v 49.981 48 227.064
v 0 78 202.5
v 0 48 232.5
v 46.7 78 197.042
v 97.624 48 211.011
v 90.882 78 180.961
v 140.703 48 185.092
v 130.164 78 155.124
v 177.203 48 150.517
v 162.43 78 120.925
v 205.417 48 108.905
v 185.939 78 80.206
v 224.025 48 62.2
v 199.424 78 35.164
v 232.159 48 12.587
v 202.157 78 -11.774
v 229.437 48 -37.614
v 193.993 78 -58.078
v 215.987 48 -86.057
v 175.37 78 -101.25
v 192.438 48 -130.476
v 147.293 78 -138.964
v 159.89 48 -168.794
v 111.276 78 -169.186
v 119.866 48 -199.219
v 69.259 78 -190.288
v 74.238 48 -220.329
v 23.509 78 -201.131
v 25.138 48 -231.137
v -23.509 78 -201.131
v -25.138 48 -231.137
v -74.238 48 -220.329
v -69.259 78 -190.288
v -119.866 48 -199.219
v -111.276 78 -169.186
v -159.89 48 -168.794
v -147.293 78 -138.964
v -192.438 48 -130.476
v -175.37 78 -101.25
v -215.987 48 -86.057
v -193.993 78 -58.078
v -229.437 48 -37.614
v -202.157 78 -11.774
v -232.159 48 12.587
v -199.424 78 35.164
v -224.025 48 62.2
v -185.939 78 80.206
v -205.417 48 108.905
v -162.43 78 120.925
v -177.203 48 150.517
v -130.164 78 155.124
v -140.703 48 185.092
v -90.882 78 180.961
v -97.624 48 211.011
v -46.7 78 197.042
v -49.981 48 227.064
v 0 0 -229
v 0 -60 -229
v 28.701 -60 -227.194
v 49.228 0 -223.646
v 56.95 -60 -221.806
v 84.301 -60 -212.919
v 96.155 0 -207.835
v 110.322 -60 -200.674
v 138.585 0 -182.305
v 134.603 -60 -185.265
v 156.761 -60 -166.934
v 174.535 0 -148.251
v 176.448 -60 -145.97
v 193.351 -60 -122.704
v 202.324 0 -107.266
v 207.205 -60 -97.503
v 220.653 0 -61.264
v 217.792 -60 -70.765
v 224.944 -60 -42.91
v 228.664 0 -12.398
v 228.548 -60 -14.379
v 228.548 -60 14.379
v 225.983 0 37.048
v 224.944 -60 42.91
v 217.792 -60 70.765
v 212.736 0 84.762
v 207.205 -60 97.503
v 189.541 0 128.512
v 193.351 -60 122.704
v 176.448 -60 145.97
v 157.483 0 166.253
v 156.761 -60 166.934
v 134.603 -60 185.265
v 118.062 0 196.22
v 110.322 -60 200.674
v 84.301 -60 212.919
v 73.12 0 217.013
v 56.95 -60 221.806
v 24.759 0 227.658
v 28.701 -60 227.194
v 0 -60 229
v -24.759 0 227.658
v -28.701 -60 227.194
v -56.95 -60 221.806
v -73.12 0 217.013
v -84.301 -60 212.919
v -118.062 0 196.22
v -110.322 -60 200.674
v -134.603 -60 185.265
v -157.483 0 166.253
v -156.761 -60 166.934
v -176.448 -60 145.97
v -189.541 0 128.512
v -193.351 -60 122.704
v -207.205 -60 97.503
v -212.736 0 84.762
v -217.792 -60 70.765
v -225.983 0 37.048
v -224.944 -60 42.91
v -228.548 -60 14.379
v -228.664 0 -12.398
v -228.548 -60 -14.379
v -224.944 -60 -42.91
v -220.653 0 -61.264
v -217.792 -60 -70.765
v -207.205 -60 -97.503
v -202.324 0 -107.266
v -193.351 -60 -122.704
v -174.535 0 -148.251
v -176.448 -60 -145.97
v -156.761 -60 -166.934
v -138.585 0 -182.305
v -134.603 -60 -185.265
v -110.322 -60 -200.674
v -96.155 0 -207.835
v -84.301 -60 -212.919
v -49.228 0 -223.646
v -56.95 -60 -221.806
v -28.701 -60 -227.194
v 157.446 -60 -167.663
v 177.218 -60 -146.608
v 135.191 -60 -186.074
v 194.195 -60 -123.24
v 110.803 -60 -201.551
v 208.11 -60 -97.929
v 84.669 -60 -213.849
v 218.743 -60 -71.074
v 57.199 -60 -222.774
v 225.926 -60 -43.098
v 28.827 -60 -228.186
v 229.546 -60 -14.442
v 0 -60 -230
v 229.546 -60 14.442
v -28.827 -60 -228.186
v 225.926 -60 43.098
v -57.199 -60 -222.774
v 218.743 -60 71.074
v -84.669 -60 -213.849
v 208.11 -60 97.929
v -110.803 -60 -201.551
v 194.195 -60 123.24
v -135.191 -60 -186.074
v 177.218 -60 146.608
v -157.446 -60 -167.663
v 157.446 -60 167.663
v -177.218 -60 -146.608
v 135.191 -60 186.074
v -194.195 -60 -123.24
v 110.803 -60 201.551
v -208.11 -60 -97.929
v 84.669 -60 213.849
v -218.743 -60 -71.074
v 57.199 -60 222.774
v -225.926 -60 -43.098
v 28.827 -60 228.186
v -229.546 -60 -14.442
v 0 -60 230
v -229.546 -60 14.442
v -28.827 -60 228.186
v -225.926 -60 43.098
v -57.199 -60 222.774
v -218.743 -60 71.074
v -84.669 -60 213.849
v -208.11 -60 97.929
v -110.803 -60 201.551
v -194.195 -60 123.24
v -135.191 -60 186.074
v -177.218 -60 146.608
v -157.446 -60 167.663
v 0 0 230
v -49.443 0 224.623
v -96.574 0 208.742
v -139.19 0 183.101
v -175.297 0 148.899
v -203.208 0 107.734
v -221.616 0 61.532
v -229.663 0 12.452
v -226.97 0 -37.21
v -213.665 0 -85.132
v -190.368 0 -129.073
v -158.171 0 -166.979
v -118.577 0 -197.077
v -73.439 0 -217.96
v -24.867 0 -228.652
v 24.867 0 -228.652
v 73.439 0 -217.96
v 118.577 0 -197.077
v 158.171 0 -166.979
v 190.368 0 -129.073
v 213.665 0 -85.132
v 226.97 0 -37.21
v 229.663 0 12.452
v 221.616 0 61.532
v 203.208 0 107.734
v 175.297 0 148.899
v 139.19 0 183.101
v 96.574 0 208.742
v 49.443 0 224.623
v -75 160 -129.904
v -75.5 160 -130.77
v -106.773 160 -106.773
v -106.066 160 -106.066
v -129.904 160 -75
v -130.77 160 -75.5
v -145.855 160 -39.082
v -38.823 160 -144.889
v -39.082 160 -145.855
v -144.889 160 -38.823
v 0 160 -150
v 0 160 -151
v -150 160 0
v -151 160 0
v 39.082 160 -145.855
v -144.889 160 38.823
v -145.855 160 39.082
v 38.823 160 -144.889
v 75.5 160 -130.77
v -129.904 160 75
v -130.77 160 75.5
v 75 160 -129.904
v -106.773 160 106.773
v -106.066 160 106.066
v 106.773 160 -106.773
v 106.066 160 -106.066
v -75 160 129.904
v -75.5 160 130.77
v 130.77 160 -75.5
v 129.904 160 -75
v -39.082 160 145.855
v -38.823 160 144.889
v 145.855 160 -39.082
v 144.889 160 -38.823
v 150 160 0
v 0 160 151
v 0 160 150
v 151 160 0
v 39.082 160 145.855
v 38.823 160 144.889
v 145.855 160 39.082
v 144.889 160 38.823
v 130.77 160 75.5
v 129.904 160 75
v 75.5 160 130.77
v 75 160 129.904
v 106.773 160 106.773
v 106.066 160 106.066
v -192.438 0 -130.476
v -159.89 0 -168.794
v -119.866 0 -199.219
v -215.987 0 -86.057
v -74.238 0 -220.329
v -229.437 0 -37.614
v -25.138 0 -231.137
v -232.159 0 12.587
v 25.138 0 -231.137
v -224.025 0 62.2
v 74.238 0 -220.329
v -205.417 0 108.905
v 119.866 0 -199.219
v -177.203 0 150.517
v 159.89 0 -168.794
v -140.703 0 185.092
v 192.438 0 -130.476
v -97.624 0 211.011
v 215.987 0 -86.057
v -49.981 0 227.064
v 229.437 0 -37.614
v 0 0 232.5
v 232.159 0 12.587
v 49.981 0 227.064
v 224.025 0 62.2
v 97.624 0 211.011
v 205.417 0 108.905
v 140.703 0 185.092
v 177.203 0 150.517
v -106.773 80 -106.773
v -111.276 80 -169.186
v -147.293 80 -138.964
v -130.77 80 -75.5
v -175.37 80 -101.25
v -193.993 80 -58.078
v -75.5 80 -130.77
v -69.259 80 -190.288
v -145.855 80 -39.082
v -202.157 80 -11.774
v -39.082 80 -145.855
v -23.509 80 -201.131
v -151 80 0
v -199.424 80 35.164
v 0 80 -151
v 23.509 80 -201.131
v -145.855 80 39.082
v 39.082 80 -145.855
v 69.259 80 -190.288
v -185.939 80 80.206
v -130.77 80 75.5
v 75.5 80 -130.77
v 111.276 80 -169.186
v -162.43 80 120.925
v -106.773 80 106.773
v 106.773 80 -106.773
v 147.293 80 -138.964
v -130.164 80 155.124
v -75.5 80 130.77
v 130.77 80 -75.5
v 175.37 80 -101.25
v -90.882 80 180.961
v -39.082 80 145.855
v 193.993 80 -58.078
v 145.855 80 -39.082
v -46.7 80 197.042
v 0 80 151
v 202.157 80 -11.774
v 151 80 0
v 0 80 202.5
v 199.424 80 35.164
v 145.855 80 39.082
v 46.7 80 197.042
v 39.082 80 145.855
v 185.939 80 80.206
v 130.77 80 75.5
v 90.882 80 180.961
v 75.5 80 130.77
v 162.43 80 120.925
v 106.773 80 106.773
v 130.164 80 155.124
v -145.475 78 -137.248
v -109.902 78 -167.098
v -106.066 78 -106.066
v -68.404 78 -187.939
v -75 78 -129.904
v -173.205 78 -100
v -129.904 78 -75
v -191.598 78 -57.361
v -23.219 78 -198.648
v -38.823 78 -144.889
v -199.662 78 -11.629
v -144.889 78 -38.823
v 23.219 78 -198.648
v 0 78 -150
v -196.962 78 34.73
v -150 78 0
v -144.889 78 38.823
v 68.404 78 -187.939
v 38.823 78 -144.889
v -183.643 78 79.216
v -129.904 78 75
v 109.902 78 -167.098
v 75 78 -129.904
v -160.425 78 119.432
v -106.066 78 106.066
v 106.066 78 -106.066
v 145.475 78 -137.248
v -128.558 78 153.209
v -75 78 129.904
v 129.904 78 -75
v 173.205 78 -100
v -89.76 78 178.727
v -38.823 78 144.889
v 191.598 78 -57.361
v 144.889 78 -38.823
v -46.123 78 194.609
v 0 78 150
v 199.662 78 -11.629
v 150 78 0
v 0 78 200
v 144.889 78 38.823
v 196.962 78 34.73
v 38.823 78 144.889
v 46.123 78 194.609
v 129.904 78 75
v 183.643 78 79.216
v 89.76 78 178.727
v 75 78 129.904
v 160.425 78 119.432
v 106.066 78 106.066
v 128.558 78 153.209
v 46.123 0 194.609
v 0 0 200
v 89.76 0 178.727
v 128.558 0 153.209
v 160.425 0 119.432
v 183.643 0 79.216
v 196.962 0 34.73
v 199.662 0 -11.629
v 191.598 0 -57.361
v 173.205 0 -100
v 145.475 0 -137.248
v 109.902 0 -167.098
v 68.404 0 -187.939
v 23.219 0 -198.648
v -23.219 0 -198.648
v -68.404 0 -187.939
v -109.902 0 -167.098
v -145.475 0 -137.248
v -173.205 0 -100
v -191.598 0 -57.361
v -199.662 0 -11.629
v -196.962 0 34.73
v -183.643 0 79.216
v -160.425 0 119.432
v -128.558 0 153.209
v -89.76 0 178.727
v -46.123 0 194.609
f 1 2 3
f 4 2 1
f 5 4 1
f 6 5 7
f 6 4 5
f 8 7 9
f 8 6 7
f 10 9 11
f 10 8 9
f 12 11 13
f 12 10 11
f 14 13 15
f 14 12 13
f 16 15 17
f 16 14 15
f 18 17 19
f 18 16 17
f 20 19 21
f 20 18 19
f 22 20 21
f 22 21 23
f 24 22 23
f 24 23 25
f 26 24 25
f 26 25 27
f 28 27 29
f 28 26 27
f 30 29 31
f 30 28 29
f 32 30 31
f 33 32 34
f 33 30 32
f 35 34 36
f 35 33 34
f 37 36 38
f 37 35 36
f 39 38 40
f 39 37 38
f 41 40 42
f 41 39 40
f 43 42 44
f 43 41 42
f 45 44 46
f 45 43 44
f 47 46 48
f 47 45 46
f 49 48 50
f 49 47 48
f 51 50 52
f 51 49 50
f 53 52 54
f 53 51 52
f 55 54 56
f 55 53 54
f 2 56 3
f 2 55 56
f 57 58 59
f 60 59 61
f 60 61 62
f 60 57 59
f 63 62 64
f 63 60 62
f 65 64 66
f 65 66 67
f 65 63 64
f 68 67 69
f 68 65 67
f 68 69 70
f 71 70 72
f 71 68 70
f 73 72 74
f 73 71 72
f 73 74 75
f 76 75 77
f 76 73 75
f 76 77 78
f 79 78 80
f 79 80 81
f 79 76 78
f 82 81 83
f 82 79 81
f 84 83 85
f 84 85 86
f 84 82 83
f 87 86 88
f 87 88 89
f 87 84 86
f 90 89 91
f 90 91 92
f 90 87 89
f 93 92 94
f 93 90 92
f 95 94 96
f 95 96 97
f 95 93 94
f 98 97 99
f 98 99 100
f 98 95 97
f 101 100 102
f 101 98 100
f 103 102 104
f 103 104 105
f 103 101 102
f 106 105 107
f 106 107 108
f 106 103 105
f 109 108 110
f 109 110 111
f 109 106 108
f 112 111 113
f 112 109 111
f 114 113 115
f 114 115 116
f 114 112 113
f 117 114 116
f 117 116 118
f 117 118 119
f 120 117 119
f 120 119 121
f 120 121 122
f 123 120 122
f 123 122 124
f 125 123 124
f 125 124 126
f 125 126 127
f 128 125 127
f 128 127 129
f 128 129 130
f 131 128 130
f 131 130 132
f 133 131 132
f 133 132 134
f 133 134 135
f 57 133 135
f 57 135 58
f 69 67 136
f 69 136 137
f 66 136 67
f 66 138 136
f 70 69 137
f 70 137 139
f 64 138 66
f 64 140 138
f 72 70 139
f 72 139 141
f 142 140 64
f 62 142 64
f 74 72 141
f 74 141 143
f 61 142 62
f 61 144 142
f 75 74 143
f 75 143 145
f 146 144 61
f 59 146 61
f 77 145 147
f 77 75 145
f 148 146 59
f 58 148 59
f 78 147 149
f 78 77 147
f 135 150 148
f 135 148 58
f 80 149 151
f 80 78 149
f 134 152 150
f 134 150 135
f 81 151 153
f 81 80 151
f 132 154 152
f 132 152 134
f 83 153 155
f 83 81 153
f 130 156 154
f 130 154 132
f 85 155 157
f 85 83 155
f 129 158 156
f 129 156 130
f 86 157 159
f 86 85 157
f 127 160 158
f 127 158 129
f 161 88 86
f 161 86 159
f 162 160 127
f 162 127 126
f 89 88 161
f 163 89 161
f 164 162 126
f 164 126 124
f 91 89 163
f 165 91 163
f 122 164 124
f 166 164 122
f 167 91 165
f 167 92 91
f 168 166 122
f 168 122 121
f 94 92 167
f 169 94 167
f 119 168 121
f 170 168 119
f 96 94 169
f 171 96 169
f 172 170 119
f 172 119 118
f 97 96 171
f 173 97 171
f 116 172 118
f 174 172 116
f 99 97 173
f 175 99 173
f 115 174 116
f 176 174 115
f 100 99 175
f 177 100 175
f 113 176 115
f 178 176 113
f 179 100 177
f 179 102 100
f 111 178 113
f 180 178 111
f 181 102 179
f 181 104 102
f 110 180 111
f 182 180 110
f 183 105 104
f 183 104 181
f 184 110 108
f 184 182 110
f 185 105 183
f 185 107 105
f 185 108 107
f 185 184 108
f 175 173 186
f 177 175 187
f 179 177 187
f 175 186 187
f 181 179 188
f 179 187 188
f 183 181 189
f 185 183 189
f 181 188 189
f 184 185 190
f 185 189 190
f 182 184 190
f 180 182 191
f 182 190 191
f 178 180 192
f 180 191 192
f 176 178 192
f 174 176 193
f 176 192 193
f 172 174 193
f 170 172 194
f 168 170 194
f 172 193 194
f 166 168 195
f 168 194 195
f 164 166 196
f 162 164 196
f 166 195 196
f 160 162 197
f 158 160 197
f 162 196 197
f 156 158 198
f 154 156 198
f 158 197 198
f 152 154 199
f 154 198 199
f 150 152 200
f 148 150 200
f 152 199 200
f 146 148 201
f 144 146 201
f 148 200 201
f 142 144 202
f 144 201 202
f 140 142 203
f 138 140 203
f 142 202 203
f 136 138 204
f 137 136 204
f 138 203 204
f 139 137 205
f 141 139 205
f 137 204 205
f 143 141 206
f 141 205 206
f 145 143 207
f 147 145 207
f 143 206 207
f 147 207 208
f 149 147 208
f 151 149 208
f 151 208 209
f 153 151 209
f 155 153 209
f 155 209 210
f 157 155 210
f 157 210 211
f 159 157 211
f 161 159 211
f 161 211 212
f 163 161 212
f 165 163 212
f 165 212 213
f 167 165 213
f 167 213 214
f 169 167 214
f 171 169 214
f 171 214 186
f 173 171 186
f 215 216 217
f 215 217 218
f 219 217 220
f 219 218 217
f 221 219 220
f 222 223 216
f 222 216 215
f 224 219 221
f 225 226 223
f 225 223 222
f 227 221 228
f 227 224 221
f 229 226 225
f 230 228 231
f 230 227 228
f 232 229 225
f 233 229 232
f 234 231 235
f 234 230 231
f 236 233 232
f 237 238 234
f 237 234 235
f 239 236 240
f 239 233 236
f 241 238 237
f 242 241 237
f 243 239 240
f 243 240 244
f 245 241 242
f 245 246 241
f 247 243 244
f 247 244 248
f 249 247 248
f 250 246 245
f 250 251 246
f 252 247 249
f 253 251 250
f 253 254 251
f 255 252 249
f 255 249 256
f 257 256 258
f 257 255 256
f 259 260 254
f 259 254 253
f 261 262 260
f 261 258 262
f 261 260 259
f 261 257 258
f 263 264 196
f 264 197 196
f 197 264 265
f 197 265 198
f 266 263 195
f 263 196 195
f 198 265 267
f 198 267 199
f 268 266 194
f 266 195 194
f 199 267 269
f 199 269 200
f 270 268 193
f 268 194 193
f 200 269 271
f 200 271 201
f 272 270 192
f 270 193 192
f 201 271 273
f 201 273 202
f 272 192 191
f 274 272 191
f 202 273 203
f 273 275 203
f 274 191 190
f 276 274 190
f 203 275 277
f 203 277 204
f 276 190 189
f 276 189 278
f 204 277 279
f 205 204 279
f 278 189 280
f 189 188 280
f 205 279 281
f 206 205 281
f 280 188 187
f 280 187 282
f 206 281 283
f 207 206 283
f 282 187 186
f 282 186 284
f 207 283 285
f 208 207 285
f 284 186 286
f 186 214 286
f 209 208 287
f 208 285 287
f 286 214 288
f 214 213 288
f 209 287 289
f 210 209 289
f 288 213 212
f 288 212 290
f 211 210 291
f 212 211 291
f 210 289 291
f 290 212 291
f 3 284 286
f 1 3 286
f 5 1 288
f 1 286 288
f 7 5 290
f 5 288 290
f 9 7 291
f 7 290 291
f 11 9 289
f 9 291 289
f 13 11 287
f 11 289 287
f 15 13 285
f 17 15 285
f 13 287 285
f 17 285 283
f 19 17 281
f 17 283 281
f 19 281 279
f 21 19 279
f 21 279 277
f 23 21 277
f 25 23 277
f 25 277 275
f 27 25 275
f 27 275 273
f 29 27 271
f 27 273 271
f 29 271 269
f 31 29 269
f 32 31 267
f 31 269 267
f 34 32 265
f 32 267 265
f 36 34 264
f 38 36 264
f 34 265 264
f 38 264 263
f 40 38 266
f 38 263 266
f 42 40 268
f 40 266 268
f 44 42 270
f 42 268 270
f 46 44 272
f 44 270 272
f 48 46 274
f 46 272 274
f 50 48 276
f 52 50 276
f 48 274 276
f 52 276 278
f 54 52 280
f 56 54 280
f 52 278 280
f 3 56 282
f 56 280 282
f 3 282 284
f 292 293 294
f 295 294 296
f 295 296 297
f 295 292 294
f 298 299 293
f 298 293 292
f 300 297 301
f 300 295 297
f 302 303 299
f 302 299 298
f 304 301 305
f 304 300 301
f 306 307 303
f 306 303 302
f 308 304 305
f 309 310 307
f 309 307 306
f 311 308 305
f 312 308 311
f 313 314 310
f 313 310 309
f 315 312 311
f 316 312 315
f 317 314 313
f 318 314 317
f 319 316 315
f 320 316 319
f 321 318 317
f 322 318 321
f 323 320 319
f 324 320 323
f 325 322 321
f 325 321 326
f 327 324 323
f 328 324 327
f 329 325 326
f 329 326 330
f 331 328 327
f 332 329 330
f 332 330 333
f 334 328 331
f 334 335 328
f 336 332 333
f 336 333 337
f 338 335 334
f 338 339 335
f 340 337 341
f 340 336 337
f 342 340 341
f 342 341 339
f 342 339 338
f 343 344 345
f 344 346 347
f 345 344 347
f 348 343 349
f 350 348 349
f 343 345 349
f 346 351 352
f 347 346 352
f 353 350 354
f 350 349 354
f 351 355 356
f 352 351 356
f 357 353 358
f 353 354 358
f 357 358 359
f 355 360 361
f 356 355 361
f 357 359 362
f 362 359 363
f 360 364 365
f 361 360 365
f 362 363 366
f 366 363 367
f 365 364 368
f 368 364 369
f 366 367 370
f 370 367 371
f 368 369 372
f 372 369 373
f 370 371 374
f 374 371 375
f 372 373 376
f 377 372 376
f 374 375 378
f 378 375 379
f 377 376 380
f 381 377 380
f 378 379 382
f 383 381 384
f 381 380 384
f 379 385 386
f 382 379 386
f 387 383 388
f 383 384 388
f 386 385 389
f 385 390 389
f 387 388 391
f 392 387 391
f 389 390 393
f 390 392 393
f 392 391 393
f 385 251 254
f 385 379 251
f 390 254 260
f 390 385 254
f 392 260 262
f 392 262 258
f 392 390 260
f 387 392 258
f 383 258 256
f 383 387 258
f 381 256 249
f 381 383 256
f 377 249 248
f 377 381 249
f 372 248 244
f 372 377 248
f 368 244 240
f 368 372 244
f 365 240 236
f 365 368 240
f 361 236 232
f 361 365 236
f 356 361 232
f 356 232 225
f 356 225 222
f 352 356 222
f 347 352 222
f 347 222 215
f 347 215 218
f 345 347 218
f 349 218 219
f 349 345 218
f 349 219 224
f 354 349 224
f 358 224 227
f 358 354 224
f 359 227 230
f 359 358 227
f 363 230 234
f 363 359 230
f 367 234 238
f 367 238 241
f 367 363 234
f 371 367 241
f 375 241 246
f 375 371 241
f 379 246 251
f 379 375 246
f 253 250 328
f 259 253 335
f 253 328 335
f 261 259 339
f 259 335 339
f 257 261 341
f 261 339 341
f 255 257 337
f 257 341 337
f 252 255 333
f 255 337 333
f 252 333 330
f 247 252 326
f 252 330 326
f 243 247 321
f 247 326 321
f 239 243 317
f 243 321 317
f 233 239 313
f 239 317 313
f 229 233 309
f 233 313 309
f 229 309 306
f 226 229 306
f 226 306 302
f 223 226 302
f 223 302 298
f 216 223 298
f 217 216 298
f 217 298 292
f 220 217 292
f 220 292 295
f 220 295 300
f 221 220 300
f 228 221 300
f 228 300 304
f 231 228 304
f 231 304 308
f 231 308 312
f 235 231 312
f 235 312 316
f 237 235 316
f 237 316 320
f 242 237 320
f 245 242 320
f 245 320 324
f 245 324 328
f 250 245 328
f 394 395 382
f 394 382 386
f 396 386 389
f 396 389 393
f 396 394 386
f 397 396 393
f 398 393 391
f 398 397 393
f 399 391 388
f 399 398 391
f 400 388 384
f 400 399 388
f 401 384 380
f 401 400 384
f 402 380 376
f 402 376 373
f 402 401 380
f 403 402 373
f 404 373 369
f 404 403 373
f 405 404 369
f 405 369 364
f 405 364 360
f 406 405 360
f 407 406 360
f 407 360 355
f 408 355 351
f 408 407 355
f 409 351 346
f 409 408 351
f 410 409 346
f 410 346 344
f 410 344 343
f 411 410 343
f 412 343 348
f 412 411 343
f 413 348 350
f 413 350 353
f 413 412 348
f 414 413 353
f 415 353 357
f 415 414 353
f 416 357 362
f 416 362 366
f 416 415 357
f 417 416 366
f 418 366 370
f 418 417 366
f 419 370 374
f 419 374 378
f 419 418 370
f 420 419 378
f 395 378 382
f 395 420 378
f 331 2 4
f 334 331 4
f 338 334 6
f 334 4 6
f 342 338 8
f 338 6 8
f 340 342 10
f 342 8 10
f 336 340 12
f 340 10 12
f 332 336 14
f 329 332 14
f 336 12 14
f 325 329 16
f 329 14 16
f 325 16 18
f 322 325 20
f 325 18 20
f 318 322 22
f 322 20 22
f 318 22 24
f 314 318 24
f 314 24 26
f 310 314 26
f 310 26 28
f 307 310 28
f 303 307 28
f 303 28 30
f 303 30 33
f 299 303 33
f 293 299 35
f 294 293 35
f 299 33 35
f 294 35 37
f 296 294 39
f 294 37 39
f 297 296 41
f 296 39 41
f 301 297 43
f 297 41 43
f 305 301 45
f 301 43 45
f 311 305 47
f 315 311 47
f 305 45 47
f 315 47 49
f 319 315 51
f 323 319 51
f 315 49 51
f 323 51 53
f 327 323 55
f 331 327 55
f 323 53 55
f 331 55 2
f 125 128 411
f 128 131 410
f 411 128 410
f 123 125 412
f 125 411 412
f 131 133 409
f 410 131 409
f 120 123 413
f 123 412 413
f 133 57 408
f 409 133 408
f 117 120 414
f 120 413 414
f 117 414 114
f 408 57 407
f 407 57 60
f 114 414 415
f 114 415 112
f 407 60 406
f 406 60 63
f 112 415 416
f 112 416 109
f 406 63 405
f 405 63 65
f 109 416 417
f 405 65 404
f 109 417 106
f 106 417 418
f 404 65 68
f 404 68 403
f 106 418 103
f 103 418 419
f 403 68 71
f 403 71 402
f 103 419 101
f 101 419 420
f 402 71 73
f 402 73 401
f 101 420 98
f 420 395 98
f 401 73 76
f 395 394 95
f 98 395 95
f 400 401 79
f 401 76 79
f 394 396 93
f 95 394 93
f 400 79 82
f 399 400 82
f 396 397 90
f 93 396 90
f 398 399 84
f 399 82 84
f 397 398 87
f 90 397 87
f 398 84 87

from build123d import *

# Parameters (mm, degrees)
SKETCH_1_R        = 232.5
SKETCH_1_R_2      = 200
EXTRUDE_1_DEPTH   = 78
SKETCH_2_R        = 151
SKETCH_2_R_2      = 150
EXTRUDE_2_DEPTH   = 82
CHAMFER_1_SIZE    = 30
SKETCH_4_R        = 202.5
SKETCH_4_R_2      = 150
EXTRUDE_1_2_DEPTH = 2
SKETCH_5_R        = 230
SKETCH_5_R_2      = 229
EXTRUDE_2_2_DEPTH = 60


with BuildPart() as part:
    # Эскиз1 → Extrude 1 (new body)
    with BuildSketch(Plane(origin=(0, 0, 0), x_dir=(1, 0, 0), z_dir=(0, 1, 0))):
        with Locations(Location((0, 0, 0), (0, 0, 270))):
            Circle(SKETCH_1_R)
        with Locations(Location((0, 0, 0), (0, 0, 270))):
            Circle(SKETCH_1_R_2, mode=Mode.SUBTRACT)
    extrude(amount=EXTRUDE_1_DEPTH)

    # Фаска1
    chamfer_1_edges = [part.edges().sort_by_distance(p)[0] for p in [
        (0, 78, -232.5),
    ]]
    chamfer(chamfer_1_edges, length=CHAMFER_1_SIZE)



with BuildPart() as body_2:
    # Эскиз2 → Extrude 2 (new body)
    with BuildSketch(Plane(origin=(0, 78, 0), x_dir=(1, 0, 0), z_dir=(0, 1, 0))):
        with Locations(Location((0, 0, 0), (0, 0, 270))):
            Circle(SKETCH_2_R)
        with Locations(Location((0, 0, 0), (0, 0, 270))):
            Circle(SKETCH_2_R_2, mode=Mode.SUBTRACT)
    extrude(amount=EXTRUDE_2_DEPTH)


with BuildPart() as part_1:
    add(part.part)

    add(body_2.part)  # Extrude 1 2 merges body 2
    # Эскиз4 → Extrude 1 2 (add)
    with BuildSketch(Plane(origin=(0, 78, 0), x_dir=(1, 0, 0), z_dir=(0, 1, 0))):
        with Locations(Location((0, 0, 0), (0, 0, 270))):
            Circle(SKETCH_4_R)
        with Locations(Location((0, 0, 0), (0, 0, 270))):
            Circle(SKETCH_4_R_2, mode=Mode.SUBTRACT)
    extrude(amount=EXTRUDE_1_2_DEPTH)

    # Эскиз5 → Extrude 2 2 (add)
    with BuildSketch(Plane.XZ):
        with Locations(Location((0, 0, 0), (0, 0, 90))):
            Circle(SKETCH_5_R)
        with Locations(Location((0, 0, 0), (0, 0, 270))):
            Circle(SKETCH_5_R_2, mode=Mode.SUBTRACT)
    extrude(amount=EXTRUDE_2_2_DEPTH)


solid = part_1.part
